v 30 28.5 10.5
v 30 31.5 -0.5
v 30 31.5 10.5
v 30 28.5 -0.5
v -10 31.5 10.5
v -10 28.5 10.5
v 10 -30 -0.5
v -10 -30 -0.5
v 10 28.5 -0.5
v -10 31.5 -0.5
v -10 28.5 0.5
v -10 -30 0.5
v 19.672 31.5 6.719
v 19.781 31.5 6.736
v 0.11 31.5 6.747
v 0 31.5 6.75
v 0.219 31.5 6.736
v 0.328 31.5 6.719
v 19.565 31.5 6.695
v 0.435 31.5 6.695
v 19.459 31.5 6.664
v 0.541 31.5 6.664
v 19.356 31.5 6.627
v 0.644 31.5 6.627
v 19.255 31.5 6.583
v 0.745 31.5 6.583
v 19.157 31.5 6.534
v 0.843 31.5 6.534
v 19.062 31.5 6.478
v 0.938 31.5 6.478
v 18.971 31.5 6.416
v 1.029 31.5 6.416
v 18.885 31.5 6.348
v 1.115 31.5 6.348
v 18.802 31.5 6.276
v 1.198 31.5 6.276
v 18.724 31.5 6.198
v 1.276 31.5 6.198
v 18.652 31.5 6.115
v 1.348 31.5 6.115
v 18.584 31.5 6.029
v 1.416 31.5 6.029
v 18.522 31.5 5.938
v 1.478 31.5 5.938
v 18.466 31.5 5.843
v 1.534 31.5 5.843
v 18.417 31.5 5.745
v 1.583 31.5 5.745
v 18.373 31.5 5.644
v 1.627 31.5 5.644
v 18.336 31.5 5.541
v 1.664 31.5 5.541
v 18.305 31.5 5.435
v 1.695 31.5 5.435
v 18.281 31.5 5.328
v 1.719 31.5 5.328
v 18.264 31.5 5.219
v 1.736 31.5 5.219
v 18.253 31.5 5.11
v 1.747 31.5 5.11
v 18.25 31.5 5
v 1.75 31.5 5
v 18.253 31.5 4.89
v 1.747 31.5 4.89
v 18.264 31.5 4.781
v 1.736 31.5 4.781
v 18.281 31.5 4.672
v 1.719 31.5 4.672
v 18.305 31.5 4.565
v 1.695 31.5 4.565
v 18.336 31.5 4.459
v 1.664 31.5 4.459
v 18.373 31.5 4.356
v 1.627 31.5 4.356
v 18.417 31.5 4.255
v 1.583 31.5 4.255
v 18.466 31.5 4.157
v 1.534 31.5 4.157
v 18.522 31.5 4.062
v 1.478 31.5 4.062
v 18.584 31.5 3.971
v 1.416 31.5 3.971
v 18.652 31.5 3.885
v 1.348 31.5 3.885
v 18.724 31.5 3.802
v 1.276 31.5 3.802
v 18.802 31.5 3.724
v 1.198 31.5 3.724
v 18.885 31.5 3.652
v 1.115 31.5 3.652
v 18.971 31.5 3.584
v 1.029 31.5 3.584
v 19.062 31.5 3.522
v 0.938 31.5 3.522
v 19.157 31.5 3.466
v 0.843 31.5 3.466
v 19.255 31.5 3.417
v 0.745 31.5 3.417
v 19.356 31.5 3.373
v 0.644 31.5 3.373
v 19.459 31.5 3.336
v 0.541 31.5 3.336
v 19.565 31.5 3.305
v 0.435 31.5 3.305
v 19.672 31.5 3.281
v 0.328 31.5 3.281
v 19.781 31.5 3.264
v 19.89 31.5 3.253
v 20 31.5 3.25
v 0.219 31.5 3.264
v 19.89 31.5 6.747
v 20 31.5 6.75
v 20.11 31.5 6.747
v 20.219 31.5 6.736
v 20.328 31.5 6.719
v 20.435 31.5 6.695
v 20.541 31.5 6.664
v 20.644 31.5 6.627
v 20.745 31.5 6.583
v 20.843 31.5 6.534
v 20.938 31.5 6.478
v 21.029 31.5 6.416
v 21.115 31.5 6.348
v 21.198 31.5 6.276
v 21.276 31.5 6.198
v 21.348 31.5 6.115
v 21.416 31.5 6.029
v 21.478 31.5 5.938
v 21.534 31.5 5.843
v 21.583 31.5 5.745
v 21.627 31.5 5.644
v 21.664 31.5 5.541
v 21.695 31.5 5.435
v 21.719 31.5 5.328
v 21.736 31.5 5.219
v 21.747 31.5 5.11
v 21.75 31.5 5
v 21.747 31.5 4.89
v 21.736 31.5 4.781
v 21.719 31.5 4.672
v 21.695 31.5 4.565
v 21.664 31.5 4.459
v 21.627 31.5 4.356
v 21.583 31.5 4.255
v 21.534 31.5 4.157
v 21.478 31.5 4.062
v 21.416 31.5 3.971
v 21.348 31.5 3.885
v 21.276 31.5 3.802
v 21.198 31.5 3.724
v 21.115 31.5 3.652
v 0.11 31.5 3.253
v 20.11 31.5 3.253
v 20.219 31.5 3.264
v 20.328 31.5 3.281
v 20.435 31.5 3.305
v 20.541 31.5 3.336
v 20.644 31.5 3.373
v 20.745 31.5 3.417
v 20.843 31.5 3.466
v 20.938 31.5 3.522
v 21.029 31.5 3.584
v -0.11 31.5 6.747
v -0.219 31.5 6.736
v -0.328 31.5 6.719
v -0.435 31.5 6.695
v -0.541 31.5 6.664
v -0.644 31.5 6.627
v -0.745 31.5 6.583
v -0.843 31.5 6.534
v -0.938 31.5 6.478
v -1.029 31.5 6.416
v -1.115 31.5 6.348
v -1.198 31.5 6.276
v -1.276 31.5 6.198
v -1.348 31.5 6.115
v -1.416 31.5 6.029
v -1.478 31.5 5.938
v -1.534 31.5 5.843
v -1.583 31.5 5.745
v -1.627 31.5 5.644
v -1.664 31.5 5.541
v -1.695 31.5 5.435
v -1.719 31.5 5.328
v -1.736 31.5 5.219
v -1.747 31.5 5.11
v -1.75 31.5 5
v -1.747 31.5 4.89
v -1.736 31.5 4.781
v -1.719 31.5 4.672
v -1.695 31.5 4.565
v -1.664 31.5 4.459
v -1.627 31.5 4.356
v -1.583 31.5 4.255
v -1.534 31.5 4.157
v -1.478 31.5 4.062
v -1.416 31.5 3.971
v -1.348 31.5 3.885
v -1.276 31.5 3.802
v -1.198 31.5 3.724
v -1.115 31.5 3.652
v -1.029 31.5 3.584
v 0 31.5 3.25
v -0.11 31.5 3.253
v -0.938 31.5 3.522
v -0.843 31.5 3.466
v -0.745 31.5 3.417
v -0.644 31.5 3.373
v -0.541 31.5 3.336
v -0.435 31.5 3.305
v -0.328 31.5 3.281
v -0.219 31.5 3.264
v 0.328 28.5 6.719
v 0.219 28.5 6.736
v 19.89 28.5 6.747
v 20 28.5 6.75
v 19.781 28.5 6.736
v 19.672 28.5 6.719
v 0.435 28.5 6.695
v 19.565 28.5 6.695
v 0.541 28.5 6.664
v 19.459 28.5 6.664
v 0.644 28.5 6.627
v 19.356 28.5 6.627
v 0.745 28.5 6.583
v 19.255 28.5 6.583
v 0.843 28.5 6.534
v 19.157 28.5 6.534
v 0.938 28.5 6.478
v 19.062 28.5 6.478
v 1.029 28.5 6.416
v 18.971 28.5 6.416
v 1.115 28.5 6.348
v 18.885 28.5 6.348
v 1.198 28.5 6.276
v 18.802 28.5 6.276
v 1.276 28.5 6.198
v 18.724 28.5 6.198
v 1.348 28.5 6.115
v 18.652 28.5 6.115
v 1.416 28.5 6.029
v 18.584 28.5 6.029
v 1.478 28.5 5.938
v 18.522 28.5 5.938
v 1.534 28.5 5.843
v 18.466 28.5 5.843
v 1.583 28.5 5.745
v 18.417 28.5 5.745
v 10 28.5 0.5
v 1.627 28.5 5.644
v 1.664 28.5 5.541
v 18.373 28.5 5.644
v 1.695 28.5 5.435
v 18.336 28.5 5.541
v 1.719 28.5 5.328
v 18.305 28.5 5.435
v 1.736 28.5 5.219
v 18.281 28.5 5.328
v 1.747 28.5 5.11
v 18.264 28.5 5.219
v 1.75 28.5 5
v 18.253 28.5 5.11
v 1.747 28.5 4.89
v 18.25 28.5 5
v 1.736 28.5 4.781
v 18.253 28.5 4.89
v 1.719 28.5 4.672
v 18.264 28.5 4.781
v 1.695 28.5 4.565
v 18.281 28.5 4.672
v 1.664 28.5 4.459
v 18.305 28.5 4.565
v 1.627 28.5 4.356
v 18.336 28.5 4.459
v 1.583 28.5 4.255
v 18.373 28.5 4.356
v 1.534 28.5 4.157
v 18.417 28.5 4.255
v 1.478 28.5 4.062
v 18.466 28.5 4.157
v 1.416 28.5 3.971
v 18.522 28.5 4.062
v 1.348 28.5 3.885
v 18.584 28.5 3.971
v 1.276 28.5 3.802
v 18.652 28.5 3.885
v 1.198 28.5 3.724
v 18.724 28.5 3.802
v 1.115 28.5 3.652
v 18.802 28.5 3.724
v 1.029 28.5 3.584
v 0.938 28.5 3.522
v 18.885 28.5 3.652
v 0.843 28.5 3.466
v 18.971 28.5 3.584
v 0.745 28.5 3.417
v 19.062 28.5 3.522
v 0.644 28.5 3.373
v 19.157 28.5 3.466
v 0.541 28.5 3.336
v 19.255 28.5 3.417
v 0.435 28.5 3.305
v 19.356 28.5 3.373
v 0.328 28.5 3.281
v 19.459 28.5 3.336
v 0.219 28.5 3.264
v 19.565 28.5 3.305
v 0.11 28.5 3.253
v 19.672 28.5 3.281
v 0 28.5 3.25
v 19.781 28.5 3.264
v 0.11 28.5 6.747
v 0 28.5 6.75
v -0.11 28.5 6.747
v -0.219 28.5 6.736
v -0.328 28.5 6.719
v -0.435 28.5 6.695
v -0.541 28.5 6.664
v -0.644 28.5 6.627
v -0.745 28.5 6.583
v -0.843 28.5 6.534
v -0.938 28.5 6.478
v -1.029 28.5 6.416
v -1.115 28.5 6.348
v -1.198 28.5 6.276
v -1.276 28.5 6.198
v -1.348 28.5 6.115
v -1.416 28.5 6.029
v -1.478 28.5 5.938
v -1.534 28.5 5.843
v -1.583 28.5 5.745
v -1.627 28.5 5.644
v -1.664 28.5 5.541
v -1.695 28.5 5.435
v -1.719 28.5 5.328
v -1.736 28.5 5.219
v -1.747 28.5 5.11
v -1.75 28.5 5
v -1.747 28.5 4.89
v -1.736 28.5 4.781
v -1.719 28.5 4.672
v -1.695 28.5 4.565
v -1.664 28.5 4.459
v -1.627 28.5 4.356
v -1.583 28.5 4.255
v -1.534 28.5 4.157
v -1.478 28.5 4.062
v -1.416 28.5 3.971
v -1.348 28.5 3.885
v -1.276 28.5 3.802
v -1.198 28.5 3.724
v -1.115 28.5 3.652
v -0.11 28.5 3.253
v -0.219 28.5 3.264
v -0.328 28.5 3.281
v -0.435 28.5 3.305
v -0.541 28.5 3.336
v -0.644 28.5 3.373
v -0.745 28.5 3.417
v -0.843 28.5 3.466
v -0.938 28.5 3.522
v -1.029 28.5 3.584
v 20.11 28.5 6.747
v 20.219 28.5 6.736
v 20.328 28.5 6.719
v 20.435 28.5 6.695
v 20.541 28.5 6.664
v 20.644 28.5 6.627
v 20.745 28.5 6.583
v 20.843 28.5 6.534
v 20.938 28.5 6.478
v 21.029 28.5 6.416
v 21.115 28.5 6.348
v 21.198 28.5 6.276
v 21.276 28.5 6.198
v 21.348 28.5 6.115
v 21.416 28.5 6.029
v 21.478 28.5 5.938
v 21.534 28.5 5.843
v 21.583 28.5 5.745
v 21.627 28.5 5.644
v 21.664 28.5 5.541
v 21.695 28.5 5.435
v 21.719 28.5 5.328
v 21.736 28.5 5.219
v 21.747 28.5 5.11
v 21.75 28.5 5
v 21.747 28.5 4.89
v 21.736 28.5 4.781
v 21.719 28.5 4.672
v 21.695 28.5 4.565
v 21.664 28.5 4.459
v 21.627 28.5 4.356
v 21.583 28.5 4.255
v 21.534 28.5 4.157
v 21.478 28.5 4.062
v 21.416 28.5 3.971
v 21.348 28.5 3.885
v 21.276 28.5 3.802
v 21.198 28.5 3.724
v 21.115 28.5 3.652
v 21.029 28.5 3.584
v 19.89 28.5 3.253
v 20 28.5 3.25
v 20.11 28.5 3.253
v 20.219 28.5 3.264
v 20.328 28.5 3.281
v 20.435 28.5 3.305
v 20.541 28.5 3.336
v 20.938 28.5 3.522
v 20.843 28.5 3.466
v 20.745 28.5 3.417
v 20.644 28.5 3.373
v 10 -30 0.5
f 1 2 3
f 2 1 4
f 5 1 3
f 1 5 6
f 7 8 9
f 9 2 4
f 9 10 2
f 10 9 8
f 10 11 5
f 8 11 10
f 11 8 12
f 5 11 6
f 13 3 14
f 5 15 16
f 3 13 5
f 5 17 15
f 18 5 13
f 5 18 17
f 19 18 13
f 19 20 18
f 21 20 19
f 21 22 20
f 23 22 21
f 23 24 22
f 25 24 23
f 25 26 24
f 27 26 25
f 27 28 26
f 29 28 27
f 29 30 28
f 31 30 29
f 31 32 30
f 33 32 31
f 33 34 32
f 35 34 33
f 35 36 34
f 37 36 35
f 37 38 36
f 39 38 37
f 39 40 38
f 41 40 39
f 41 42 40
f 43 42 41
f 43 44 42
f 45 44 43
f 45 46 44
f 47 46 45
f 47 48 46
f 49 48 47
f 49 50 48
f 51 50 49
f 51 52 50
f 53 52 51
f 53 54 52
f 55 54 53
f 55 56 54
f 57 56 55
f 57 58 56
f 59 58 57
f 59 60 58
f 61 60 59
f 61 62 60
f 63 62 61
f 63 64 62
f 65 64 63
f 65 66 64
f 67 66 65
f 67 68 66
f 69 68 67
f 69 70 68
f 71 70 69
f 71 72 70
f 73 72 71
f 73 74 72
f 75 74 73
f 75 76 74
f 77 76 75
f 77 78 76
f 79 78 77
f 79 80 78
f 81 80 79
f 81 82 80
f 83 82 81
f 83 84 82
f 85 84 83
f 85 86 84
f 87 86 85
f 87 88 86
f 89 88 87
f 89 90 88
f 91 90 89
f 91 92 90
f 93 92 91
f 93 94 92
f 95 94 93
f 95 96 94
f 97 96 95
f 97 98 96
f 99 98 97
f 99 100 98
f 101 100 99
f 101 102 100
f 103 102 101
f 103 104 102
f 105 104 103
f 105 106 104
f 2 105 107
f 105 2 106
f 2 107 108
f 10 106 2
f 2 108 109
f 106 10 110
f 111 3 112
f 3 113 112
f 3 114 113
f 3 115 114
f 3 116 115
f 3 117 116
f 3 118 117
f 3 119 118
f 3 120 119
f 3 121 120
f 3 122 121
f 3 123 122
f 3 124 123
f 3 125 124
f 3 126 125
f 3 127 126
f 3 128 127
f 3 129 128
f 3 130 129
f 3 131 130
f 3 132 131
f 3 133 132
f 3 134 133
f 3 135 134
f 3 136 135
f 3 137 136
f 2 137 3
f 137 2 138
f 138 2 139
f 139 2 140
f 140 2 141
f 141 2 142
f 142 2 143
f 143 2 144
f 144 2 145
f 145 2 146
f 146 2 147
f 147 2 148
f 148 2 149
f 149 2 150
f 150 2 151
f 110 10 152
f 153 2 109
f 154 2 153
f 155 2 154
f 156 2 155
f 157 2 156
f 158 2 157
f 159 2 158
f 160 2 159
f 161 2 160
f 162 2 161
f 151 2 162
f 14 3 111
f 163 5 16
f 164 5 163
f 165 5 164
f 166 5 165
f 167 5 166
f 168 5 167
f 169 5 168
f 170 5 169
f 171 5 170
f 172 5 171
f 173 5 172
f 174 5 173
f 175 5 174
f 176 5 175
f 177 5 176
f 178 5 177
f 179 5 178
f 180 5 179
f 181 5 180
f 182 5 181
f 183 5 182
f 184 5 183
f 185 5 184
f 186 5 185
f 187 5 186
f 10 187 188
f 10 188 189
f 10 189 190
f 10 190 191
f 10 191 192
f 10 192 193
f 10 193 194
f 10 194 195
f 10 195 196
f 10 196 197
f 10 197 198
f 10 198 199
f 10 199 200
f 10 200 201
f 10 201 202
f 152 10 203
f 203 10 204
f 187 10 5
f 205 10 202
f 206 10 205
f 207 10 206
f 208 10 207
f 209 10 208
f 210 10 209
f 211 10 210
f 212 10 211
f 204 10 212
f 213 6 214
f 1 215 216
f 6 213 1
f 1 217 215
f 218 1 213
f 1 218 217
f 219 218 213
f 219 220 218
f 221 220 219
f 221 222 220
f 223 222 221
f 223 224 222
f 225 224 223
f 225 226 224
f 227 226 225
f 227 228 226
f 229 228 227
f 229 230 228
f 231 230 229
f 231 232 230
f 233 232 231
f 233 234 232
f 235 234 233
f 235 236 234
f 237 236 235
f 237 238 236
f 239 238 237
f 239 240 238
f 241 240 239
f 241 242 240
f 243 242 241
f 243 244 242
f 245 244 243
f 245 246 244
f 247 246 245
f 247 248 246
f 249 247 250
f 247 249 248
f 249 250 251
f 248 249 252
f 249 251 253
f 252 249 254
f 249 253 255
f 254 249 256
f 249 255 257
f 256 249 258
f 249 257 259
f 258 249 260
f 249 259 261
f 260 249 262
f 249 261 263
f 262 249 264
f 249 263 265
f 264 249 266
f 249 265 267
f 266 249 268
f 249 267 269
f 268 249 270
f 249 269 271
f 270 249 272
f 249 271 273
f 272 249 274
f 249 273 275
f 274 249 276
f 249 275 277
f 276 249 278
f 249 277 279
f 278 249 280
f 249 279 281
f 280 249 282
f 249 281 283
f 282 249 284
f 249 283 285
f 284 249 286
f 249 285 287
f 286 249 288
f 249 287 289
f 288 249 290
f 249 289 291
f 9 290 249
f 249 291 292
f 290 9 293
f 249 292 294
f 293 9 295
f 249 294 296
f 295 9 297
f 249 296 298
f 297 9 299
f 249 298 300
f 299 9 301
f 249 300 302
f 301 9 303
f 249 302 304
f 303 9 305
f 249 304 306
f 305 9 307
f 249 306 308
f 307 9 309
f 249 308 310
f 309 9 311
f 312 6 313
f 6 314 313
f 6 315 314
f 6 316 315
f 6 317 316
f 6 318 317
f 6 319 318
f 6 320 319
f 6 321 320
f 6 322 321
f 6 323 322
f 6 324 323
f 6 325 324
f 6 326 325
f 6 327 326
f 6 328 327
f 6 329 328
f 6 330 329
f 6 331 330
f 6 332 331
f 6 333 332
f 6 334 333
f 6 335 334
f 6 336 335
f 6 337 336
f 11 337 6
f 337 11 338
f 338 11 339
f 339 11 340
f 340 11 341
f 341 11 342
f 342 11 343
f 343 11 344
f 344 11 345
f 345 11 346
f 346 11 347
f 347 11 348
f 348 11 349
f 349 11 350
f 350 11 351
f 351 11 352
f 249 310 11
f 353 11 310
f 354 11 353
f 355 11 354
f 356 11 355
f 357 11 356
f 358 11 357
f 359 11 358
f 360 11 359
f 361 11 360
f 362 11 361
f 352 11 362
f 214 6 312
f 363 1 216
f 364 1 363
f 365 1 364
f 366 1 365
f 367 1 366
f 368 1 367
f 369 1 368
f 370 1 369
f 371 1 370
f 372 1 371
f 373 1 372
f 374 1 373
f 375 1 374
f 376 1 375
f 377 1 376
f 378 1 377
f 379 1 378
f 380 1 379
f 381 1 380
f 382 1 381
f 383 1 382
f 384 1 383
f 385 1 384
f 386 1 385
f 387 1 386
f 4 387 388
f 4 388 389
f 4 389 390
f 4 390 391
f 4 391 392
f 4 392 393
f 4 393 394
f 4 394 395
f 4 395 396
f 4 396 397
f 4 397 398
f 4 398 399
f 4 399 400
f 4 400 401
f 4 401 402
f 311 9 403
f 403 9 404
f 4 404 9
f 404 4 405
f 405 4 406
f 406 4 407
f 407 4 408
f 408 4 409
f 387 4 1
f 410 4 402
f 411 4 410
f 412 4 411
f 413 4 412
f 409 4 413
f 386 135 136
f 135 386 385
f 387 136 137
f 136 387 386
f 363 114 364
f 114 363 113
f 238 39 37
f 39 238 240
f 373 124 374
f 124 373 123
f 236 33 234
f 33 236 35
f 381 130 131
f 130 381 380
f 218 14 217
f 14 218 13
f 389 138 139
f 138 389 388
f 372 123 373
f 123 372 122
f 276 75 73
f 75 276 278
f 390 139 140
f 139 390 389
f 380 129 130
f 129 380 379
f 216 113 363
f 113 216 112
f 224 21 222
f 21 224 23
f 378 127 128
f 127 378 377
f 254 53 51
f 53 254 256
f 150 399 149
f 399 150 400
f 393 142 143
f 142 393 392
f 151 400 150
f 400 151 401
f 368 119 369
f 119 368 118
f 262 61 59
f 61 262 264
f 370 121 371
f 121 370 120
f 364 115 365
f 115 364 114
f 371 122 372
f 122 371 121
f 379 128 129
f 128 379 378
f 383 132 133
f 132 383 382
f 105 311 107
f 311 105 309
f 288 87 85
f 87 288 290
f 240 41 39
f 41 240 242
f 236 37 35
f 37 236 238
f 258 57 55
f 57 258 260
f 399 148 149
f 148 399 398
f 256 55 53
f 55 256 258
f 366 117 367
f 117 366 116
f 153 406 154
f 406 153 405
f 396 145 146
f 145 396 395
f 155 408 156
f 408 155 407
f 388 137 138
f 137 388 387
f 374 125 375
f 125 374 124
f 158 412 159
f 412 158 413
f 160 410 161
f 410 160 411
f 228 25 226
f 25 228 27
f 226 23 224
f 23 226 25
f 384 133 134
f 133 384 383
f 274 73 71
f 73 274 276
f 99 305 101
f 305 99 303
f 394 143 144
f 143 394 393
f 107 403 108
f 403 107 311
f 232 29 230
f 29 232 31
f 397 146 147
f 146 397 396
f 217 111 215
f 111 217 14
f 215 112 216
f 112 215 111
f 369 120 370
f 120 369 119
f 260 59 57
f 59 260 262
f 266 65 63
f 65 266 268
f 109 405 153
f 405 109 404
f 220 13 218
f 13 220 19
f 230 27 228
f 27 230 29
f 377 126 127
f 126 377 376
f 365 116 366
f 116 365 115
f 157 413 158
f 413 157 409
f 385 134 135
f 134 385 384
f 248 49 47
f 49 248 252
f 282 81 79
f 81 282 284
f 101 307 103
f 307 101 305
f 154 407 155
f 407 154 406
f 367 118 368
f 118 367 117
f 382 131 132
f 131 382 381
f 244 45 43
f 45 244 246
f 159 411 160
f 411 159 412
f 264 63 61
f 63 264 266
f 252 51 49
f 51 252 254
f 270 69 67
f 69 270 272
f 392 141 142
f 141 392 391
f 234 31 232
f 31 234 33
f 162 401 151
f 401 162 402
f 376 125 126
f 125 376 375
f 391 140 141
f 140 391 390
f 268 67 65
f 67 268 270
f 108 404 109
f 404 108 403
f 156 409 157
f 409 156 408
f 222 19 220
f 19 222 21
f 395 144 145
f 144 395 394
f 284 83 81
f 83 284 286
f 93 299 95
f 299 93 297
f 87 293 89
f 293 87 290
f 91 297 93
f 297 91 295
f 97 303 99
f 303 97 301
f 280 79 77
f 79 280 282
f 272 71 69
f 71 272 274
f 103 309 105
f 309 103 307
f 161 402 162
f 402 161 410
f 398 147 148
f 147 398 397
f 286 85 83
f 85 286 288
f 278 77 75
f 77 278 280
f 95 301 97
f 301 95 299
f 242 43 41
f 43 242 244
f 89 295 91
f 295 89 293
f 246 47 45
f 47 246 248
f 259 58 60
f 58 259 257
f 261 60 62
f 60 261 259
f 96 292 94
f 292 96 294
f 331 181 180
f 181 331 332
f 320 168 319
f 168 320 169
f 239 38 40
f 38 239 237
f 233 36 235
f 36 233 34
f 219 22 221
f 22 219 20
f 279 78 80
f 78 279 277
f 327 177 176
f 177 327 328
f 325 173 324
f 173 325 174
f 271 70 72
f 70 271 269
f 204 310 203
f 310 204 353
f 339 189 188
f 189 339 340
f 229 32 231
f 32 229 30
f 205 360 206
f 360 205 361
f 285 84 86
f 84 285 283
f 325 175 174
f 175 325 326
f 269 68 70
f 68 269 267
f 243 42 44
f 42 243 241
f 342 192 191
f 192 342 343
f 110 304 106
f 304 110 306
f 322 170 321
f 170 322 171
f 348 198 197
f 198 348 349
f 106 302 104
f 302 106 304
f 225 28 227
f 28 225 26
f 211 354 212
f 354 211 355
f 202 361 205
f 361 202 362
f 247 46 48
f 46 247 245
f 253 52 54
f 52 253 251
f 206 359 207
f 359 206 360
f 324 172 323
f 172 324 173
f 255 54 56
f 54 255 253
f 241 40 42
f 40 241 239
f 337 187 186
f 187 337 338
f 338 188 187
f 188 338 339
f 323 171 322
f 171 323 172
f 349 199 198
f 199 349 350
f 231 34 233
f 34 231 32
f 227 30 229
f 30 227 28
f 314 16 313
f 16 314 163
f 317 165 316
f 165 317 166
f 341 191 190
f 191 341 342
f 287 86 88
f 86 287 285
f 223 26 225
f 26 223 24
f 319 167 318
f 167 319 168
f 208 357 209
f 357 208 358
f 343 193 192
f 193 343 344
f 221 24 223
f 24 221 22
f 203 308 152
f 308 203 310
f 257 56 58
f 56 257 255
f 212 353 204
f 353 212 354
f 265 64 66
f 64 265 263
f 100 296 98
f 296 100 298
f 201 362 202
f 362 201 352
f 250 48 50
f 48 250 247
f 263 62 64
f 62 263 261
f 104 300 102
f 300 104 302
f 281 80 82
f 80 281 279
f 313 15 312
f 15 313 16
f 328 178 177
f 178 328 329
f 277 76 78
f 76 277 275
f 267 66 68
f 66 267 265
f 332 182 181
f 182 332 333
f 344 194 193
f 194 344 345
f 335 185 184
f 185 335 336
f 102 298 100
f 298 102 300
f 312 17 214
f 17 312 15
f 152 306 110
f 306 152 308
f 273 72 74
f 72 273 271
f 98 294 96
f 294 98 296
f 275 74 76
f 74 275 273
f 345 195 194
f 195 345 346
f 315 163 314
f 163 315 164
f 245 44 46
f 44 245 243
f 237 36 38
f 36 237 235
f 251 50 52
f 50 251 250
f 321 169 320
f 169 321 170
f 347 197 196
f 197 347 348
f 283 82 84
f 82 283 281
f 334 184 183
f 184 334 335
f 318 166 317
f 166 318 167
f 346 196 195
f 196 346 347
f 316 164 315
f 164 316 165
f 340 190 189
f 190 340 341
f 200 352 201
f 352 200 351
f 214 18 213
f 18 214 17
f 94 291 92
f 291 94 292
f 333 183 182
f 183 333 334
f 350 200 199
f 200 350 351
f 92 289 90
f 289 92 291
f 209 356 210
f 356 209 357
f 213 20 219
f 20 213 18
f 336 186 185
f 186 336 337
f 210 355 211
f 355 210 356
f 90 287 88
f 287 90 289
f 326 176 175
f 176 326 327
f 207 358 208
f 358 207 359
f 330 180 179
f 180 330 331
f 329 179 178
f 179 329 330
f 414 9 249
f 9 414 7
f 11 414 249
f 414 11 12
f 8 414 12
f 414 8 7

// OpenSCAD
$fn=100;
A();
translate([30,70,-15]) rotate([0,90,0]) !B();

module A(){
difference(){
    union(){
        minkowski(){
            cube([30-3,90,2],center=true);
            cylinder(d=3,h=1,center=true);
        }
        translate([25,41.5,0])  hull(){
            translate([12,0,0]) cylinder(d=10,h=3,center=true);
            translate([-12,0,0]) cylinder(d=10,h=3,center=true);
            
        }
    }
    translate([ 9.5,0,0])hull(){
        translate([0,35,0]) cylinder(d=3.5,h=10,center=true);
        translate([0,-40,0]) cylinder(d=3.5,h=10,center=true);
    }
    translate([-9.5,0,0])hull(){
        translate([0,35,0]) cylinder(d=3.5,h=10,center=true);
        translate([0,-40,0]) cylinder(d=3.5,h=10,center=true);
    }
    translate([25,41.5,0])hull(){
        translate([12.5,0,0]) cylinder(d=3.5,h=10,center=true);
    translate([-12,0,0]) cylinder(d=3.5,h=10,center=true);
        
        
        }
    
}
}
module B(){
    cube([20,60,1],center=true);
    translate([10,30,5]) difference(){
        cube([40,3,11],center=true);
        translate([10,0,0]) rotate([90,0,0]) cylinder(d=3.5,h=10,center=true);
        translate([-10,0,0]) rotate([90,0,0]) cylinder(d=3.5,h=10,center=true);
    }
}
 
 
